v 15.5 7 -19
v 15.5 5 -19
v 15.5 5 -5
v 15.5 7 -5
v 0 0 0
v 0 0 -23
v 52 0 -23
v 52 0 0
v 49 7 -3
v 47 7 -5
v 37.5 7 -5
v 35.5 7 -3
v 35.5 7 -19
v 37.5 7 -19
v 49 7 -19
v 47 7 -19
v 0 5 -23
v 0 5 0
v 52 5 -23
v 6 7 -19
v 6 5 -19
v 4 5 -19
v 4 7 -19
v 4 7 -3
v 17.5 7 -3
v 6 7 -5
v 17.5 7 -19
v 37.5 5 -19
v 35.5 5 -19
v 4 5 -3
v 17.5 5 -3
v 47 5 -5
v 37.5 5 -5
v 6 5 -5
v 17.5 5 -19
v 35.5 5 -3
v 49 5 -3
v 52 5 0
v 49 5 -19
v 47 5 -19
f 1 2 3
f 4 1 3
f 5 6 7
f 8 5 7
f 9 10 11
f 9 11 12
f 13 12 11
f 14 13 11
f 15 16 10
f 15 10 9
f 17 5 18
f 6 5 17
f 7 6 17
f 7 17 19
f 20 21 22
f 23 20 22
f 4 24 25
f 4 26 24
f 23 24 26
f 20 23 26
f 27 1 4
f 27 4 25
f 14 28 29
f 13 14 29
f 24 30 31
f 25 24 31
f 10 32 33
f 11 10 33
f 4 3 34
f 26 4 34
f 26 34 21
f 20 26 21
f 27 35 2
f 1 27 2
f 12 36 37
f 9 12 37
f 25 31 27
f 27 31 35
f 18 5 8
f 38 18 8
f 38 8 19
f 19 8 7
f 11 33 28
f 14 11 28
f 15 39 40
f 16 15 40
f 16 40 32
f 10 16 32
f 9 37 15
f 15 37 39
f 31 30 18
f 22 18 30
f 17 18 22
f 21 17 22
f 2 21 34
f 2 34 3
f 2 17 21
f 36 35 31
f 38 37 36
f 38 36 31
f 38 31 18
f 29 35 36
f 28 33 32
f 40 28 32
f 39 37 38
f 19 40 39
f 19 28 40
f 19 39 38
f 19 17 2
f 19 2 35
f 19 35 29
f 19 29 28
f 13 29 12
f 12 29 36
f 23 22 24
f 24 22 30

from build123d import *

# Parameters (mm, degrees)
SKETCH1_W           = 52
SKETCH1_H           = 23
BOSS_EXTRUDE1_DEPTH = 5
BOSS_EXTRUDE2_DEPTH = 2


with BuildPart() as part:
    # Sketch1 → Boss-Extrude1 (new body)
    with BuildSketch(Plane(origin=(0, 0, 0), x_dir=(1, 0, 0), z_dir=(0, 1, 0))):
        with Locations((26, 11.5)):
            Rectangle(SKETCH1_W, SKETCH1_H)
    extrude(amount=BOSS_EXTRUDE1_DEPTH)

    # Sketch2 → Boss-Extrude2 (add)
    with BuildSketch(Plane(origin=(0, 5, 0), x_dir=(1, 0, 0), z_dir=(0, 1, 0))):
        Polygon((47, 5), (37.5, 5), (37.5, 19), (35.5, 19), (35.5, 3), (49, 3), (49, 19), (47, 19), align=None)
        Polygon((4, 19), (4, 3), (17.5, 3), (17.5, 19), (15.5, 19), (15.5, 5), (6, 5), (6, 19), align=None)
    extrude(amount=BOSS_EXTRUDE2_DEPTH)


solid = part.part
